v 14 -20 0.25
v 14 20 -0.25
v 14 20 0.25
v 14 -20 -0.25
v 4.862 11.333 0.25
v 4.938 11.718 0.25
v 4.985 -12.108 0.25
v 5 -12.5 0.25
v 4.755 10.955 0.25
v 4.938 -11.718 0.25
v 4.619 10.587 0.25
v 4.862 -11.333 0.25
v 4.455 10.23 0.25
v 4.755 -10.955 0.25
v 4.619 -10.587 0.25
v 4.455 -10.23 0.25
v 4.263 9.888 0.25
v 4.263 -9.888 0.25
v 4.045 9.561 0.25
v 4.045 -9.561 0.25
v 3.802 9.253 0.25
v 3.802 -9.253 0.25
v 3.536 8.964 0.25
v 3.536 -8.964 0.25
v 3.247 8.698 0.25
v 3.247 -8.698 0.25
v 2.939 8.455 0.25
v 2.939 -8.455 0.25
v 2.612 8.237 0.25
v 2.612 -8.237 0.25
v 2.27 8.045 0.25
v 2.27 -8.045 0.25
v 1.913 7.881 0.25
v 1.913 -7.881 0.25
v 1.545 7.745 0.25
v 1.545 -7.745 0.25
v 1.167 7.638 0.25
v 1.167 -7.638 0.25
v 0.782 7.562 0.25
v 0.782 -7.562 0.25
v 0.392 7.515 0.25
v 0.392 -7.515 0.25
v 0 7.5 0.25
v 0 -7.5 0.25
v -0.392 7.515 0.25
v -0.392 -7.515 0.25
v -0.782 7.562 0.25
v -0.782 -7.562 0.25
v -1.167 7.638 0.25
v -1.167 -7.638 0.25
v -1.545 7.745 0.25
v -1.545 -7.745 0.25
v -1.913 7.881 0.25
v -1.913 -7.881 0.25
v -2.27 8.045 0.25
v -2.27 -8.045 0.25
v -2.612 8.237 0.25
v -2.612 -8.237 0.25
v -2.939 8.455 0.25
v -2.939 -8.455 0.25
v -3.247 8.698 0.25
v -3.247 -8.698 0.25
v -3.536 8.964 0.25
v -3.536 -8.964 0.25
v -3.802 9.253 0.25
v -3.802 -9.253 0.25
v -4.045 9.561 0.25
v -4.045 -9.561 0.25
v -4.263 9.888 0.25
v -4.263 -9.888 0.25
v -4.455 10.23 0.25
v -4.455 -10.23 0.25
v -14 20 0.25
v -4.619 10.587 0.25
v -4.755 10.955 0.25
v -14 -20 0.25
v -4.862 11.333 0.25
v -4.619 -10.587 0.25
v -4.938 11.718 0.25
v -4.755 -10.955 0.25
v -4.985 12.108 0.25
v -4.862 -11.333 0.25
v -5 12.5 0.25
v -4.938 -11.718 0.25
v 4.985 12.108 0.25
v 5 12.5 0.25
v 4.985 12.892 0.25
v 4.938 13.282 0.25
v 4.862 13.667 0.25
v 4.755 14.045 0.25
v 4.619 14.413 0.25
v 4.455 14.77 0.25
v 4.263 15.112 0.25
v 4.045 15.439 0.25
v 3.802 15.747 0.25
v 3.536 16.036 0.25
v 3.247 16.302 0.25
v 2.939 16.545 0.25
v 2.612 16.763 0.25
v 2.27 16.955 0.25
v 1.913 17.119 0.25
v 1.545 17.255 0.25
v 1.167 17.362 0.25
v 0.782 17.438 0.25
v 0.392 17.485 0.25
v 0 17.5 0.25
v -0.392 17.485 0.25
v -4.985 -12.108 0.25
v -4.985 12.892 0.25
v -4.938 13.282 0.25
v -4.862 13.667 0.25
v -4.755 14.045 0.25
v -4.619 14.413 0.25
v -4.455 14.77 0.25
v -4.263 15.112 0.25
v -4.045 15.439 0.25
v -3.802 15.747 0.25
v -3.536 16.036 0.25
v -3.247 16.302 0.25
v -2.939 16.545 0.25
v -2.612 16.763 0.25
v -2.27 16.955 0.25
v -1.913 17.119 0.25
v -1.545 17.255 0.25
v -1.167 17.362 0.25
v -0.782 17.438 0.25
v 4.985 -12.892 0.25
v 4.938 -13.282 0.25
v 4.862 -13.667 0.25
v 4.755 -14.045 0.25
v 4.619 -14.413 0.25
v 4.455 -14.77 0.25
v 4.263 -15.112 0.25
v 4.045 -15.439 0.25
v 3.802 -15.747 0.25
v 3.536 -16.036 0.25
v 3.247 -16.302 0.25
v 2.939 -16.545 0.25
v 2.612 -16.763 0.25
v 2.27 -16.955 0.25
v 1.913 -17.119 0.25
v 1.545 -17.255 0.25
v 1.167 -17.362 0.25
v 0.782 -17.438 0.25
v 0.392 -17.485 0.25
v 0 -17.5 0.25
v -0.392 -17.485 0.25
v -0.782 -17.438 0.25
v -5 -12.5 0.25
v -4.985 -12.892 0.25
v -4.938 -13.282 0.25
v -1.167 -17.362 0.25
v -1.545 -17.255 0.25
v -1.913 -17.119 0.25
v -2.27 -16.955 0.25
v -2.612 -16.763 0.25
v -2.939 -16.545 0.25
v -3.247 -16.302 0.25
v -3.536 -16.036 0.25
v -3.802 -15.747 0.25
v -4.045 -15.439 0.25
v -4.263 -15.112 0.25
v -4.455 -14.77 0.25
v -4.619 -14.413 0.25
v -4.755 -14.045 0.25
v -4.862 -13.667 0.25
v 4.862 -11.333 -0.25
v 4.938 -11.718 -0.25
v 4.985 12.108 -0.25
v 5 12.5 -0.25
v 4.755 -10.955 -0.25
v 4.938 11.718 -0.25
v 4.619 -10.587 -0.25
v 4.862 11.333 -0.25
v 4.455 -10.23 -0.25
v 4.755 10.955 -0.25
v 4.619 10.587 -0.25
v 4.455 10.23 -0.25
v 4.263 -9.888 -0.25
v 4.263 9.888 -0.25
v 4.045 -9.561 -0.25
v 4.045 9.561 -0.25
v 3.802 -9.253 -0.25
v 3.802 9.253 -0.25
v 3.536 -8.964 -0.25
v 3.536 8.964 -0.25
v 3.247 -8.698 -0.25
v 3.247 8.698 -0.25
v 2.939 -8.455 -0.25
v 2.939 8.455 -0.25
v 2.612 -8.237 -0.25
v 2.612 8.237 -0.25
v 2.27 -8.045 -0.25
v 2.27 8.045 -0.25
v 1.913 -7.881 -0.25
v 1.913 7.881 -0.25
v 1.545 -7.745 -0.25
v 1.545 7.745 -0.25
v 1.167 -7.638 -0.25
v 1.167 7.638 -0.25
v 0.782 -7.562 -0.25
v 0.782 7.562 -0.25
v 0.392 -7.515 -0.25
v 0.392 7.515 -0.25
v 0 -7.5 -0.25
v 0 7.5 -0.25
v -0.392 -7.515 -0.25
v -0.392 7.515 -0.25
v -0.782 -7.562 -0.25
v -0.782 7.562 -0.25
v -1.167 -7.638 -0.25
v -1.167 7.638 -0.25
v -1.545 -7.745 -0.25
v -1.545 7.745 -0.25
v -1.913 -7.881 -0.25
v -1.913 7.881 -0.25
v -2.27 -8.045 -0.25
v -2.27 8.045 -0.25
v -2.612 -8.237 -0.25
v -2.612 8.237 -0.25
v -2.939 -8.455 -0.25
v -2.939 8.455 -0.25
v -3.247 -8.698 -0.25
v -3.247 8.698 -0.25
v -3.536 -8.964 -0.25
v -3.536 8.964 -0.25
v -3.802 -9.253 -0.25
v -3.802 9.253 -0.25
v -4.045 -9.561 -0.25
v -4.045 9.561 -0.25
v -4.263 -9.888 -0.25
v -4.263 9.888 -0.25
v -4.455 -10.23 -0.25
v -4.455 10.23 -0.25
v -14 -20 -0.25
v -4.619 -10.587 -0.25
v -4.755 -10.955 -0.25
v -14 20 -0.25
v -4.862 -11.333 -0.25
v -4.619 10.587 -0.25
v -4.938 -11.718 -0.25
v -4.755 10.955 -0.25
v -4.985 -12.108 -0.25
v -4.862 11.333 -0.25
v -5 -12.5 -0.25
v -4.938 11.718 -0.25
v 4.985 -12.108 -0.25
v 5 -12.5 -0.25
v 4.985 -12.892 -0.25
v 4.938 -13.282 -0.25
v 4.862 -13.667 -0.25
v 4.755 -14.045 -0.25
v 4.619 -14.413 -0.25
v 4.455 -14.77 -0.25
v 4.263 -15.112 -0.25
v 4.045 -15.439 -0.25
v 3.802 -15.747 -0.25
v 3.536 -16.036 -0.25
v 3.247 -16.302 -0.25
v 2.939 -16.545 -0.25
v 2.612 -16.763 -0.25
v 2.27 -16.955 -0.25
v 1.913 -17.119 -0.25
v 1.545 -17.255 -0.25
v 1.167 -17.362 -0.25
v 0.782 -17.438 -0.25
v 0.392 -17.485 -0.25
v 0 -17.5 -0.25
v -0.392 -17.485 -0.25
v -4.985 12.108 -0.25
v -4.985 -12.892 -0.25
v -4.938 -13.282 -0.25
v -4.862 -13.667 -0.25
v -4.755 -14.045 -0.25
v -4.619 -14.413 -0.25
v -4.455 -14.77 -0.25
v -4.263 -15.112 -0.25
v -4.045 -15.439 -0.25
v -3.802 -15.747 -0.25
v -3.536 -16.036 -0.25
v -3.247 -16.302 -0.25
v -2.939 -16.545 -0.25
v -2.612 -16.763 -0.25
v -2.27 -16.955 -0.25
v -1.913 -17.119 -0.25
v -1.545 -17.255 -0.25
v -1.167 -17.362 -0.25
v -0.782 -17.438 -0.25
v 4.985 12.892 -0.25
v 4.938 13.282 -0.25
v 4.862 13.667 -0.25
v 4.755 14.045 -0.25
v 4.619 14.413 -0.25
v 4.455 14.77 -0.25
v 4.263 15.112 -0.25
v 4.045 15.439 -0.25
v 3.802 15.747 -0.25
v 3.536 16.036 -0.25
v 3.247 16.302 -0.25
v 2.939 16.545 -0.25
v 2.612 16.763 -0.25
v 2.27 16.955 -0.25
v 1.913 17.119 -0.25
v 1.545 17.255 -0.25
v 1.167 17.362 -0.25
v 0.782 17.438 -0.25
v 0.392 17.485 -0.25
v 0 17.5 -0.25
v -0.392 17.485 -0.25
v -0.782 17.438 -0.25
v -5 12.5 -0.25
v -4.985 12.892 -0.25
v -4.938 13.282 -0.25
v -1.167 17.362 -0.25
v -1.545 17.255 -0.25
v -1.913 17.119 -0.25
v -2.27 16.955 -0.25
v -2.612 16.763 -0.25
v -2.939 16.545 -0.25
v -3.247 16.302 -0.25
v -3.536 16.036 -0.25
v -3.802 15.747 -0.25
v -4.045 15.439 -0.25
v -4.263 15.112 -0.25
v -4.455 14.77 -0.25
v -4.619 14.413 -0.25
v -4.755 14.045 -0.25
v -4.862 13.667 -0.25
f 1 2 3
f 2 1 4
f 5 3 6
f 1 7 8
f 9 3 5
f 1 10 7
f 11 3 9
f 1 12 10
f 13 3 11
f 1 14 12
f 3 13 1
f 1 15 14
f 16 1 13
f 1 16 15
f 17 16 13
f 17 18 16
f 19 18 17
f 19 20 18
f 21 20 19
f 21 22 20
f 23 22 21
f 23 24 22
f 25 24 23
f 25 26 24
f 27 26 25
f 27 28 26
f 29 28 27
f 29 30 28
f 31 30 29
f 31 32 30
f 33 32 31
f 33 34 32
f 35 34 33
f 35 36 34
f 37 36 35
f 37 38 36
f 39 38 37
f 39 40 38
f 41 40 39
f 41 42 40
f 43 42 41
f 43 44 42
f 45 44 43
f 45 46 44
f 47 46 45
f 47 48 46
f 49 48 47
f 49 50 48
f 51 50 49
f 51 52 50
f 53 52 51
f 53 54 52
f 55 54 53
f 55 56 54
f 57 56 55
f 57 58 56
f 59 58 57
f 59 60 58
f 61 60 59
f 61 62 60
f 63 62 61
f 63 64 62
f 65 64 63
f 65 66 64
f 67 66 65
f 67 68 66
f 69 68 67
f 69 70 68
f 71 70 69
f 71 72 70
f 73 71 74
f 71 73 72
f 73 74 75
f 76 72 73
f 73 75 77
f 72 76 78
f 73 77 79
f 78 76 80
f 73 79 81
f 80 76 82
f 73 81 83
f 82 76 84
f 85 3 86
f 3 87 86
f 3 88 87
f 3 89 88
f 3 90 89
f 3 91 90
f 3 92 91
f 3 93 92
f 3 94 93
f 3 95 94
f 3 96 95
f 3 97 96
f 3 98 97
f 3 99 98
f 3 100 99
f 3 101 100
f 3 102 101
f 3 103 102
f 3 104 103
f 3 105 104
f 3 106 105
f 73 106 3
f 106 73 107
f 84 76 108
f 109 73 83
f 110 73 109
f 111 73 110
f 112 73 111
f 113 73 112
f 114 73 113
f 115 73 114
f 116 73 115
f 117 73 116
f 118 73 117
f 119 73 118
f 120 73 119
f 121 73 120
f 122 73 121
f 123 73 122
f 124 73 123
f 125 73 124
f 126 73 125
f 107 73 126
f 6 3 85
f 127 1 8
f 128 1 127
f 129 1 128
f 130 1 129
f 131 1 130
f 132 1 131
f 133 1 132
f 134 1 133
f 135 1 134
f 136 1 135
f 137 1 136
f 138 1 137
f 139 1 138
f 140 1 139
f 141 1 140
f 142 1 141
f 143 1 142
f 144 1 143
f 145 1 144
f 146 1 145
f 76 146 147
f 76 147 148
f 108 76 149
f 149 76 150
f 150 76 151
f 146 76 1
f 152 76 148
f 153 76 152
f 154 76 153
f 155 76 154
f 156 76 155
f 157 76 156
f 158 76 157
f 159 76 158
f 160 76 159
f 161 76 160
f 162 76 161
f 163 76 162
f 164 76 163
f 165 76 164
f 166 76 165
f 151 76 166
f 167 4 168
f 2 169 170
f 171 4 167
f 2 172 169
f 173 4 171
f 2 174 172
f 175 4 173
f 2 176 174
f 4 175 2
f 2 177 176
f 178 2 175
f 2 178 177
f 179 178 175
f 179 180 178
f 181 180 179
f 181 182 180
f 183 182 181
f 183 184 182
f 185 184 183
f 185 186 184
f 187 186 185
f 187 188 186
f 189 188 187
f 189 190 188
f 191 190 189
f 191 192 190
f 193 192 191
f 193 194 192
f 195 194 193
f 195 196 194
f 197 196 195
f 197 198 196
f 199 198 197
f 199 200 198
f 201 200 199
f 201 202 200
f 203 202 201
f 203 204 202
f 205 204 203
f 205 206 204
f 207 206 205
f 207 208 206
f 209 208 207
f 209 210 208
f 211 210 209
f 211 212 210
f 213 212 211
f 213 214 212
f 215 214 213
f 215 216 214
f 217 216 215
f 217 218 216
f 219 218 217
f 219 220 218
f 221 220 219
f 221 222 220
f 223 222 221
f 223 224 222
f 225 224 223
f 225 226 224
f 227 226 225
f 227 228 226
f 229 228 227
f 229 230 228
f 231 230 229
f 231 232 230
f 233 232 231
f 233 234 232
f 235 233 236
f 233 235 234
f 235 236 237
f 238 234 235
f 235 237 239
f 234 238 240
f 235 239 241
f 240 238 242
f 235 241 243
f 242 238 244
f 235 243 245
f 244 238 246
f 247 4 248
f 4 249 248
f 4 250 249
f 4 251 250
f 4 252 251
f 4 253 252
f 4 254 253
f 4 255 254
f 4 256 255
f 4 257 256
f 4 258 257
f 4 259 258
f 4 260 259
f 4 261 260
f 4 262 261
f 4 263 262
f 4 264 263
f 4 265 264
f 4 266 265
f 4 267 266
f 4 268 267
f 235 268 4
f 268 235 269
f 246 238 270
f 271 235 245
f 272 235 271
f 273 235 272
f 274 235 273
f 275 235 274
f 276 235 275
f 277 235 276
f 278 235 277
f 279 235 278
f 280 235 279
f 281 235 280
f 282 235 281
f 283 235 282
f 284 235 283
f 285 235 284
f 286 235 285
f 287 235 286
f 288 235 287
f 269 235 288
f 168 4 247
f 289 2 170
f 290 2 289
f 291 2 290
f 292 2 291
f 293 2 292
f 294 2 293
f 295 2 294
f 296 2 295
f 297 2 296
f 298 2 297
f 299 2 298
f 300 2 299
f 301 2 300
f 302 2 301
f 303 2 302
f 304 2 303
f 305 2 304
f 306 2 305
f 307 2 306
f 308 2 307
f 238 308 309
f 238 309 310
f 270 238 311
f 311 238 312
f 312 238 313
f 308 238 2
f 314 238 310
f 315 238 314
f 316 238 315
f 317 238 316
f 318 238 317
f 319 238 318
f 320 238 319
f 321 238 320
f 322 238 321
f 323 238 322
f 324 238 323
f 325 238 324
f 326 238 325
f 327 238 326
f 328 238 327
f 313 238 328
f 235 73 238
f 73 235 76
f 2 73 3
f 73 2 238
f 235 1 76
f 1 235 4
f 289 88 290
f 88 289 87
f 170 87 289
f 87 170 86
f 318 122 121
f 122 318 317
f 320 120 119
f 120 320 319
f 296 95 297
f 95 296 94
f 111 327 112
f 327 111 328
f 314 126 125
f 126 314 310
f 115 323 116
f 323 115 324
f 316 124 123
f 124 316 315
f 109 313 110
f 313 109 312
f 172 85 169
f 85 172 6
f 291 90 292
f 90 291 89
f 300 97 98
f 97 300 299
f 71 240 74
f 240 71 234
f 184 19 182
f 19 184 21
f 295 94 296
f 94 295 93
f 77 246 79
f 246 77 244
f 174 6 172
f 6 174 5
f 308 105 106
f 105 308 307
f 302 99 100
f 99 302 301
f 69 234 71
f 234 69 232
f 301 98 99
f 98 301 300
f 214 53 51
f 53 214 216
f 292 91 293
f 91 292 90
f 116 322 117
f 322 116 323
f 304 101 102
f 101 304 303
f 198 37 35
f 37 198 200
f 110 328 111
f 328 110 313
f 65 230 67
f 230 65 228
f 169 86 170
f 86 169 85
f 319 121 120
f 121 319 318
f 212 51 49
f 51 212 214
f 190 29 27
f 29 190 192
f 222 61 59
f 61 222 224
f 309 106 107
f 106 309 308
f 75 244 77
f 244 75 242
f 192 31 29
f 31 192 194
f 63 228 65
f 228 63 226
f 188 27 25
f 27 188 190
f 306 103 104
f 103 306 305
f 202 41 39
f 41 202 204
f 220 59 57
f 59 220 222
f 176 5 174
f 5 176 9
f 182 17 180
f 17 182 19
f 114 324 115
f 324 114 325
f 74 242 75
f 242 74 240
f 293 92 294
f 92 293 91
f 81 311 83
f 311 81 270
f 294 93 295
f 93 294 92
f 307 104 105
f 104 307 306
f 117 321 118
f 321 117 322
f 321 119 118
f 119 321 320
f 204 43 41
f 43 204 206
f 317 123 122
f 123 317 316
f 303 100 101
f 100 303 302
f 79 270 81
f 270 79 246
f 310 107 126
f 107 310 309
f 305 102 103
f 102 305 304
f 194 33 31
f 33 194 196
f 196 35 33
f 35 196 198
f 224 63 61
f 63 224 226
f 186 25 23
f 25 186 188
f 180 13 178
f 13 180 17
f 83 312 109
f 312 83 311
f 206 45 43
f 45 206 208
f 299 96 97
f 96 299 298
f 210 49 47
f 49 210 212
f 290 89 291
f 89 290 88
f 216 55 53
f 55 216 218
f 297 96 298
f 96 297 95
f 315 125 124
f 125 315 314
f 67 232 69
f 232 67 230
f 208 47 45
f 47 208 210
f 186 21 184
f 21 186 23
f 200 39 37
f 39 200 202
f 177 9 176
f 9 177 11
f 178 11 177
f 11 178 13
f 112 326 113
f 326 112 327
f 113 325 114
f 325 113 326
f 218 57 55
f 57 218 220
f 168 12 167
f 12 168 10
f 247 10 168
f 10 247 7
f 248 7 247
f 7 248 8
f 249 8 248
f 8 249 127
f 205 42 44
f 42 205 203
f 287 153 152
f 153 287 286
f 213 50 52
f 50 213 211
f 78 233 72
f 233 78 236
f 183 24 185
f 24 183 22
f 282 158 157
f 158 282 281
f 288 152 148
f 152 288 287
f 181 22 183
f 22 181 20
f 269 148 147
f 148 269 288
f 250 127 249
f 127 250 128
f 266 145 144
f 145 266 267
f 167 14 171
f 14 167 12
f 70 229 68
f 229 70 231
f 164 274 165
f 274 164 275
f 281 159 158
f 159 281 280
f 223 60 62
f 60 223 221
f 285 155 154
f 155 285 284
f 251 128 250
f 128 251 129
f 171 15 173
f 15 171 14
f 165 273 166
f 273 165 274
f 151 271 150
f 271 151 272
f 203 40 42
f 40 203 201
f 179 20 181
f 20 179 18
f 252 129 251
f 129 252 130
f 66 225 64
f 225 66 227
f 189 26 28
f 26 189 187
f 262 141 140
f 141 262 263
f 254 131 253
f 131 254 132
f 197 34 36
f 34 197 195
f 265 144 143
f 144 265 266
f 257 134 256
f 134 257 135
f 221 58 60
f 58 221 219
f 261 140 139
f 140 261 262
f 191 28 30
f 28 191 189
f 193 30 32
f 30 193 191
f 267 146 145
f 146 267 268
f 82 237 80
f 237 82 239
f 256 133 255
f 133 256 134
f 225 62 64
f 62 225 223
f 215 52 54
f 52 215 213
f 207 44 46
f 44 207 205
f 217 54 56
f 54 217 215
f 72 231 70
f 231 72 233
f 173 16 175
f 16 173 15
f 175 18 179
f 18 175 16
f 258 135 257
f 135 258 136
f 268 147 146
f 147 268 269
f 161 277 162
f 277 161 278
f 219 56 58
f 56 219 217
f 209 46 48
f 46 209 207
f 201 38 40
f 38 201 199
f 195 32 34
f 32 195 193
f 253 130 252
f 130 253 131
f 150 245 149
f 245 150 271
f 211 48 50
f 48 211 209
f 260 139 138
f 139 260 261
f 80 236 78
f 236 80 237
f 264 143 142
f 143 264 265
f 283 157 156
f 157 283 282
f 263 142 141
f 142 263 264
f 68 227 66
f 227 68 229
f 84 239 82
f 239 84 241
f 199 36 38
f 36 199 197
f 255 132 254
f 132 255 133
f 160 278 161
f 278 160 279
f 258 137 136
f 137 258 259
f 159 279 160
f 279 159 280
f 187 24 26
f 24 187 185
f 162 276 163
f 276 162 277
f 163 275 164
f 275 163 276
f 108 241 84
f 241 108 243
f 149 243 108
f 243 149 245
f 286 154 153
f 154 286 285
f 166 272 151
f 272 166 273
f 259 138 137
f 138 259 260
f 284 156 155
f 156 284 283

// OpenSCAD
// obdelnikova podlozka

x = 28;
y = 40;
z = 0.5;
polomerDer = 5;
vzdalenostDer = 25;
$fn=80;
difference(){
cube([x, y, z], center=true);
translate([0,vzdalenostDer/2,0])
    cylinder(h=3*z, r=polomerDer, center=true);
translate([0,-vzdalenostDer/2,0])    
    cylinder(h=3*z, r=polomerDer, center=true);
}
